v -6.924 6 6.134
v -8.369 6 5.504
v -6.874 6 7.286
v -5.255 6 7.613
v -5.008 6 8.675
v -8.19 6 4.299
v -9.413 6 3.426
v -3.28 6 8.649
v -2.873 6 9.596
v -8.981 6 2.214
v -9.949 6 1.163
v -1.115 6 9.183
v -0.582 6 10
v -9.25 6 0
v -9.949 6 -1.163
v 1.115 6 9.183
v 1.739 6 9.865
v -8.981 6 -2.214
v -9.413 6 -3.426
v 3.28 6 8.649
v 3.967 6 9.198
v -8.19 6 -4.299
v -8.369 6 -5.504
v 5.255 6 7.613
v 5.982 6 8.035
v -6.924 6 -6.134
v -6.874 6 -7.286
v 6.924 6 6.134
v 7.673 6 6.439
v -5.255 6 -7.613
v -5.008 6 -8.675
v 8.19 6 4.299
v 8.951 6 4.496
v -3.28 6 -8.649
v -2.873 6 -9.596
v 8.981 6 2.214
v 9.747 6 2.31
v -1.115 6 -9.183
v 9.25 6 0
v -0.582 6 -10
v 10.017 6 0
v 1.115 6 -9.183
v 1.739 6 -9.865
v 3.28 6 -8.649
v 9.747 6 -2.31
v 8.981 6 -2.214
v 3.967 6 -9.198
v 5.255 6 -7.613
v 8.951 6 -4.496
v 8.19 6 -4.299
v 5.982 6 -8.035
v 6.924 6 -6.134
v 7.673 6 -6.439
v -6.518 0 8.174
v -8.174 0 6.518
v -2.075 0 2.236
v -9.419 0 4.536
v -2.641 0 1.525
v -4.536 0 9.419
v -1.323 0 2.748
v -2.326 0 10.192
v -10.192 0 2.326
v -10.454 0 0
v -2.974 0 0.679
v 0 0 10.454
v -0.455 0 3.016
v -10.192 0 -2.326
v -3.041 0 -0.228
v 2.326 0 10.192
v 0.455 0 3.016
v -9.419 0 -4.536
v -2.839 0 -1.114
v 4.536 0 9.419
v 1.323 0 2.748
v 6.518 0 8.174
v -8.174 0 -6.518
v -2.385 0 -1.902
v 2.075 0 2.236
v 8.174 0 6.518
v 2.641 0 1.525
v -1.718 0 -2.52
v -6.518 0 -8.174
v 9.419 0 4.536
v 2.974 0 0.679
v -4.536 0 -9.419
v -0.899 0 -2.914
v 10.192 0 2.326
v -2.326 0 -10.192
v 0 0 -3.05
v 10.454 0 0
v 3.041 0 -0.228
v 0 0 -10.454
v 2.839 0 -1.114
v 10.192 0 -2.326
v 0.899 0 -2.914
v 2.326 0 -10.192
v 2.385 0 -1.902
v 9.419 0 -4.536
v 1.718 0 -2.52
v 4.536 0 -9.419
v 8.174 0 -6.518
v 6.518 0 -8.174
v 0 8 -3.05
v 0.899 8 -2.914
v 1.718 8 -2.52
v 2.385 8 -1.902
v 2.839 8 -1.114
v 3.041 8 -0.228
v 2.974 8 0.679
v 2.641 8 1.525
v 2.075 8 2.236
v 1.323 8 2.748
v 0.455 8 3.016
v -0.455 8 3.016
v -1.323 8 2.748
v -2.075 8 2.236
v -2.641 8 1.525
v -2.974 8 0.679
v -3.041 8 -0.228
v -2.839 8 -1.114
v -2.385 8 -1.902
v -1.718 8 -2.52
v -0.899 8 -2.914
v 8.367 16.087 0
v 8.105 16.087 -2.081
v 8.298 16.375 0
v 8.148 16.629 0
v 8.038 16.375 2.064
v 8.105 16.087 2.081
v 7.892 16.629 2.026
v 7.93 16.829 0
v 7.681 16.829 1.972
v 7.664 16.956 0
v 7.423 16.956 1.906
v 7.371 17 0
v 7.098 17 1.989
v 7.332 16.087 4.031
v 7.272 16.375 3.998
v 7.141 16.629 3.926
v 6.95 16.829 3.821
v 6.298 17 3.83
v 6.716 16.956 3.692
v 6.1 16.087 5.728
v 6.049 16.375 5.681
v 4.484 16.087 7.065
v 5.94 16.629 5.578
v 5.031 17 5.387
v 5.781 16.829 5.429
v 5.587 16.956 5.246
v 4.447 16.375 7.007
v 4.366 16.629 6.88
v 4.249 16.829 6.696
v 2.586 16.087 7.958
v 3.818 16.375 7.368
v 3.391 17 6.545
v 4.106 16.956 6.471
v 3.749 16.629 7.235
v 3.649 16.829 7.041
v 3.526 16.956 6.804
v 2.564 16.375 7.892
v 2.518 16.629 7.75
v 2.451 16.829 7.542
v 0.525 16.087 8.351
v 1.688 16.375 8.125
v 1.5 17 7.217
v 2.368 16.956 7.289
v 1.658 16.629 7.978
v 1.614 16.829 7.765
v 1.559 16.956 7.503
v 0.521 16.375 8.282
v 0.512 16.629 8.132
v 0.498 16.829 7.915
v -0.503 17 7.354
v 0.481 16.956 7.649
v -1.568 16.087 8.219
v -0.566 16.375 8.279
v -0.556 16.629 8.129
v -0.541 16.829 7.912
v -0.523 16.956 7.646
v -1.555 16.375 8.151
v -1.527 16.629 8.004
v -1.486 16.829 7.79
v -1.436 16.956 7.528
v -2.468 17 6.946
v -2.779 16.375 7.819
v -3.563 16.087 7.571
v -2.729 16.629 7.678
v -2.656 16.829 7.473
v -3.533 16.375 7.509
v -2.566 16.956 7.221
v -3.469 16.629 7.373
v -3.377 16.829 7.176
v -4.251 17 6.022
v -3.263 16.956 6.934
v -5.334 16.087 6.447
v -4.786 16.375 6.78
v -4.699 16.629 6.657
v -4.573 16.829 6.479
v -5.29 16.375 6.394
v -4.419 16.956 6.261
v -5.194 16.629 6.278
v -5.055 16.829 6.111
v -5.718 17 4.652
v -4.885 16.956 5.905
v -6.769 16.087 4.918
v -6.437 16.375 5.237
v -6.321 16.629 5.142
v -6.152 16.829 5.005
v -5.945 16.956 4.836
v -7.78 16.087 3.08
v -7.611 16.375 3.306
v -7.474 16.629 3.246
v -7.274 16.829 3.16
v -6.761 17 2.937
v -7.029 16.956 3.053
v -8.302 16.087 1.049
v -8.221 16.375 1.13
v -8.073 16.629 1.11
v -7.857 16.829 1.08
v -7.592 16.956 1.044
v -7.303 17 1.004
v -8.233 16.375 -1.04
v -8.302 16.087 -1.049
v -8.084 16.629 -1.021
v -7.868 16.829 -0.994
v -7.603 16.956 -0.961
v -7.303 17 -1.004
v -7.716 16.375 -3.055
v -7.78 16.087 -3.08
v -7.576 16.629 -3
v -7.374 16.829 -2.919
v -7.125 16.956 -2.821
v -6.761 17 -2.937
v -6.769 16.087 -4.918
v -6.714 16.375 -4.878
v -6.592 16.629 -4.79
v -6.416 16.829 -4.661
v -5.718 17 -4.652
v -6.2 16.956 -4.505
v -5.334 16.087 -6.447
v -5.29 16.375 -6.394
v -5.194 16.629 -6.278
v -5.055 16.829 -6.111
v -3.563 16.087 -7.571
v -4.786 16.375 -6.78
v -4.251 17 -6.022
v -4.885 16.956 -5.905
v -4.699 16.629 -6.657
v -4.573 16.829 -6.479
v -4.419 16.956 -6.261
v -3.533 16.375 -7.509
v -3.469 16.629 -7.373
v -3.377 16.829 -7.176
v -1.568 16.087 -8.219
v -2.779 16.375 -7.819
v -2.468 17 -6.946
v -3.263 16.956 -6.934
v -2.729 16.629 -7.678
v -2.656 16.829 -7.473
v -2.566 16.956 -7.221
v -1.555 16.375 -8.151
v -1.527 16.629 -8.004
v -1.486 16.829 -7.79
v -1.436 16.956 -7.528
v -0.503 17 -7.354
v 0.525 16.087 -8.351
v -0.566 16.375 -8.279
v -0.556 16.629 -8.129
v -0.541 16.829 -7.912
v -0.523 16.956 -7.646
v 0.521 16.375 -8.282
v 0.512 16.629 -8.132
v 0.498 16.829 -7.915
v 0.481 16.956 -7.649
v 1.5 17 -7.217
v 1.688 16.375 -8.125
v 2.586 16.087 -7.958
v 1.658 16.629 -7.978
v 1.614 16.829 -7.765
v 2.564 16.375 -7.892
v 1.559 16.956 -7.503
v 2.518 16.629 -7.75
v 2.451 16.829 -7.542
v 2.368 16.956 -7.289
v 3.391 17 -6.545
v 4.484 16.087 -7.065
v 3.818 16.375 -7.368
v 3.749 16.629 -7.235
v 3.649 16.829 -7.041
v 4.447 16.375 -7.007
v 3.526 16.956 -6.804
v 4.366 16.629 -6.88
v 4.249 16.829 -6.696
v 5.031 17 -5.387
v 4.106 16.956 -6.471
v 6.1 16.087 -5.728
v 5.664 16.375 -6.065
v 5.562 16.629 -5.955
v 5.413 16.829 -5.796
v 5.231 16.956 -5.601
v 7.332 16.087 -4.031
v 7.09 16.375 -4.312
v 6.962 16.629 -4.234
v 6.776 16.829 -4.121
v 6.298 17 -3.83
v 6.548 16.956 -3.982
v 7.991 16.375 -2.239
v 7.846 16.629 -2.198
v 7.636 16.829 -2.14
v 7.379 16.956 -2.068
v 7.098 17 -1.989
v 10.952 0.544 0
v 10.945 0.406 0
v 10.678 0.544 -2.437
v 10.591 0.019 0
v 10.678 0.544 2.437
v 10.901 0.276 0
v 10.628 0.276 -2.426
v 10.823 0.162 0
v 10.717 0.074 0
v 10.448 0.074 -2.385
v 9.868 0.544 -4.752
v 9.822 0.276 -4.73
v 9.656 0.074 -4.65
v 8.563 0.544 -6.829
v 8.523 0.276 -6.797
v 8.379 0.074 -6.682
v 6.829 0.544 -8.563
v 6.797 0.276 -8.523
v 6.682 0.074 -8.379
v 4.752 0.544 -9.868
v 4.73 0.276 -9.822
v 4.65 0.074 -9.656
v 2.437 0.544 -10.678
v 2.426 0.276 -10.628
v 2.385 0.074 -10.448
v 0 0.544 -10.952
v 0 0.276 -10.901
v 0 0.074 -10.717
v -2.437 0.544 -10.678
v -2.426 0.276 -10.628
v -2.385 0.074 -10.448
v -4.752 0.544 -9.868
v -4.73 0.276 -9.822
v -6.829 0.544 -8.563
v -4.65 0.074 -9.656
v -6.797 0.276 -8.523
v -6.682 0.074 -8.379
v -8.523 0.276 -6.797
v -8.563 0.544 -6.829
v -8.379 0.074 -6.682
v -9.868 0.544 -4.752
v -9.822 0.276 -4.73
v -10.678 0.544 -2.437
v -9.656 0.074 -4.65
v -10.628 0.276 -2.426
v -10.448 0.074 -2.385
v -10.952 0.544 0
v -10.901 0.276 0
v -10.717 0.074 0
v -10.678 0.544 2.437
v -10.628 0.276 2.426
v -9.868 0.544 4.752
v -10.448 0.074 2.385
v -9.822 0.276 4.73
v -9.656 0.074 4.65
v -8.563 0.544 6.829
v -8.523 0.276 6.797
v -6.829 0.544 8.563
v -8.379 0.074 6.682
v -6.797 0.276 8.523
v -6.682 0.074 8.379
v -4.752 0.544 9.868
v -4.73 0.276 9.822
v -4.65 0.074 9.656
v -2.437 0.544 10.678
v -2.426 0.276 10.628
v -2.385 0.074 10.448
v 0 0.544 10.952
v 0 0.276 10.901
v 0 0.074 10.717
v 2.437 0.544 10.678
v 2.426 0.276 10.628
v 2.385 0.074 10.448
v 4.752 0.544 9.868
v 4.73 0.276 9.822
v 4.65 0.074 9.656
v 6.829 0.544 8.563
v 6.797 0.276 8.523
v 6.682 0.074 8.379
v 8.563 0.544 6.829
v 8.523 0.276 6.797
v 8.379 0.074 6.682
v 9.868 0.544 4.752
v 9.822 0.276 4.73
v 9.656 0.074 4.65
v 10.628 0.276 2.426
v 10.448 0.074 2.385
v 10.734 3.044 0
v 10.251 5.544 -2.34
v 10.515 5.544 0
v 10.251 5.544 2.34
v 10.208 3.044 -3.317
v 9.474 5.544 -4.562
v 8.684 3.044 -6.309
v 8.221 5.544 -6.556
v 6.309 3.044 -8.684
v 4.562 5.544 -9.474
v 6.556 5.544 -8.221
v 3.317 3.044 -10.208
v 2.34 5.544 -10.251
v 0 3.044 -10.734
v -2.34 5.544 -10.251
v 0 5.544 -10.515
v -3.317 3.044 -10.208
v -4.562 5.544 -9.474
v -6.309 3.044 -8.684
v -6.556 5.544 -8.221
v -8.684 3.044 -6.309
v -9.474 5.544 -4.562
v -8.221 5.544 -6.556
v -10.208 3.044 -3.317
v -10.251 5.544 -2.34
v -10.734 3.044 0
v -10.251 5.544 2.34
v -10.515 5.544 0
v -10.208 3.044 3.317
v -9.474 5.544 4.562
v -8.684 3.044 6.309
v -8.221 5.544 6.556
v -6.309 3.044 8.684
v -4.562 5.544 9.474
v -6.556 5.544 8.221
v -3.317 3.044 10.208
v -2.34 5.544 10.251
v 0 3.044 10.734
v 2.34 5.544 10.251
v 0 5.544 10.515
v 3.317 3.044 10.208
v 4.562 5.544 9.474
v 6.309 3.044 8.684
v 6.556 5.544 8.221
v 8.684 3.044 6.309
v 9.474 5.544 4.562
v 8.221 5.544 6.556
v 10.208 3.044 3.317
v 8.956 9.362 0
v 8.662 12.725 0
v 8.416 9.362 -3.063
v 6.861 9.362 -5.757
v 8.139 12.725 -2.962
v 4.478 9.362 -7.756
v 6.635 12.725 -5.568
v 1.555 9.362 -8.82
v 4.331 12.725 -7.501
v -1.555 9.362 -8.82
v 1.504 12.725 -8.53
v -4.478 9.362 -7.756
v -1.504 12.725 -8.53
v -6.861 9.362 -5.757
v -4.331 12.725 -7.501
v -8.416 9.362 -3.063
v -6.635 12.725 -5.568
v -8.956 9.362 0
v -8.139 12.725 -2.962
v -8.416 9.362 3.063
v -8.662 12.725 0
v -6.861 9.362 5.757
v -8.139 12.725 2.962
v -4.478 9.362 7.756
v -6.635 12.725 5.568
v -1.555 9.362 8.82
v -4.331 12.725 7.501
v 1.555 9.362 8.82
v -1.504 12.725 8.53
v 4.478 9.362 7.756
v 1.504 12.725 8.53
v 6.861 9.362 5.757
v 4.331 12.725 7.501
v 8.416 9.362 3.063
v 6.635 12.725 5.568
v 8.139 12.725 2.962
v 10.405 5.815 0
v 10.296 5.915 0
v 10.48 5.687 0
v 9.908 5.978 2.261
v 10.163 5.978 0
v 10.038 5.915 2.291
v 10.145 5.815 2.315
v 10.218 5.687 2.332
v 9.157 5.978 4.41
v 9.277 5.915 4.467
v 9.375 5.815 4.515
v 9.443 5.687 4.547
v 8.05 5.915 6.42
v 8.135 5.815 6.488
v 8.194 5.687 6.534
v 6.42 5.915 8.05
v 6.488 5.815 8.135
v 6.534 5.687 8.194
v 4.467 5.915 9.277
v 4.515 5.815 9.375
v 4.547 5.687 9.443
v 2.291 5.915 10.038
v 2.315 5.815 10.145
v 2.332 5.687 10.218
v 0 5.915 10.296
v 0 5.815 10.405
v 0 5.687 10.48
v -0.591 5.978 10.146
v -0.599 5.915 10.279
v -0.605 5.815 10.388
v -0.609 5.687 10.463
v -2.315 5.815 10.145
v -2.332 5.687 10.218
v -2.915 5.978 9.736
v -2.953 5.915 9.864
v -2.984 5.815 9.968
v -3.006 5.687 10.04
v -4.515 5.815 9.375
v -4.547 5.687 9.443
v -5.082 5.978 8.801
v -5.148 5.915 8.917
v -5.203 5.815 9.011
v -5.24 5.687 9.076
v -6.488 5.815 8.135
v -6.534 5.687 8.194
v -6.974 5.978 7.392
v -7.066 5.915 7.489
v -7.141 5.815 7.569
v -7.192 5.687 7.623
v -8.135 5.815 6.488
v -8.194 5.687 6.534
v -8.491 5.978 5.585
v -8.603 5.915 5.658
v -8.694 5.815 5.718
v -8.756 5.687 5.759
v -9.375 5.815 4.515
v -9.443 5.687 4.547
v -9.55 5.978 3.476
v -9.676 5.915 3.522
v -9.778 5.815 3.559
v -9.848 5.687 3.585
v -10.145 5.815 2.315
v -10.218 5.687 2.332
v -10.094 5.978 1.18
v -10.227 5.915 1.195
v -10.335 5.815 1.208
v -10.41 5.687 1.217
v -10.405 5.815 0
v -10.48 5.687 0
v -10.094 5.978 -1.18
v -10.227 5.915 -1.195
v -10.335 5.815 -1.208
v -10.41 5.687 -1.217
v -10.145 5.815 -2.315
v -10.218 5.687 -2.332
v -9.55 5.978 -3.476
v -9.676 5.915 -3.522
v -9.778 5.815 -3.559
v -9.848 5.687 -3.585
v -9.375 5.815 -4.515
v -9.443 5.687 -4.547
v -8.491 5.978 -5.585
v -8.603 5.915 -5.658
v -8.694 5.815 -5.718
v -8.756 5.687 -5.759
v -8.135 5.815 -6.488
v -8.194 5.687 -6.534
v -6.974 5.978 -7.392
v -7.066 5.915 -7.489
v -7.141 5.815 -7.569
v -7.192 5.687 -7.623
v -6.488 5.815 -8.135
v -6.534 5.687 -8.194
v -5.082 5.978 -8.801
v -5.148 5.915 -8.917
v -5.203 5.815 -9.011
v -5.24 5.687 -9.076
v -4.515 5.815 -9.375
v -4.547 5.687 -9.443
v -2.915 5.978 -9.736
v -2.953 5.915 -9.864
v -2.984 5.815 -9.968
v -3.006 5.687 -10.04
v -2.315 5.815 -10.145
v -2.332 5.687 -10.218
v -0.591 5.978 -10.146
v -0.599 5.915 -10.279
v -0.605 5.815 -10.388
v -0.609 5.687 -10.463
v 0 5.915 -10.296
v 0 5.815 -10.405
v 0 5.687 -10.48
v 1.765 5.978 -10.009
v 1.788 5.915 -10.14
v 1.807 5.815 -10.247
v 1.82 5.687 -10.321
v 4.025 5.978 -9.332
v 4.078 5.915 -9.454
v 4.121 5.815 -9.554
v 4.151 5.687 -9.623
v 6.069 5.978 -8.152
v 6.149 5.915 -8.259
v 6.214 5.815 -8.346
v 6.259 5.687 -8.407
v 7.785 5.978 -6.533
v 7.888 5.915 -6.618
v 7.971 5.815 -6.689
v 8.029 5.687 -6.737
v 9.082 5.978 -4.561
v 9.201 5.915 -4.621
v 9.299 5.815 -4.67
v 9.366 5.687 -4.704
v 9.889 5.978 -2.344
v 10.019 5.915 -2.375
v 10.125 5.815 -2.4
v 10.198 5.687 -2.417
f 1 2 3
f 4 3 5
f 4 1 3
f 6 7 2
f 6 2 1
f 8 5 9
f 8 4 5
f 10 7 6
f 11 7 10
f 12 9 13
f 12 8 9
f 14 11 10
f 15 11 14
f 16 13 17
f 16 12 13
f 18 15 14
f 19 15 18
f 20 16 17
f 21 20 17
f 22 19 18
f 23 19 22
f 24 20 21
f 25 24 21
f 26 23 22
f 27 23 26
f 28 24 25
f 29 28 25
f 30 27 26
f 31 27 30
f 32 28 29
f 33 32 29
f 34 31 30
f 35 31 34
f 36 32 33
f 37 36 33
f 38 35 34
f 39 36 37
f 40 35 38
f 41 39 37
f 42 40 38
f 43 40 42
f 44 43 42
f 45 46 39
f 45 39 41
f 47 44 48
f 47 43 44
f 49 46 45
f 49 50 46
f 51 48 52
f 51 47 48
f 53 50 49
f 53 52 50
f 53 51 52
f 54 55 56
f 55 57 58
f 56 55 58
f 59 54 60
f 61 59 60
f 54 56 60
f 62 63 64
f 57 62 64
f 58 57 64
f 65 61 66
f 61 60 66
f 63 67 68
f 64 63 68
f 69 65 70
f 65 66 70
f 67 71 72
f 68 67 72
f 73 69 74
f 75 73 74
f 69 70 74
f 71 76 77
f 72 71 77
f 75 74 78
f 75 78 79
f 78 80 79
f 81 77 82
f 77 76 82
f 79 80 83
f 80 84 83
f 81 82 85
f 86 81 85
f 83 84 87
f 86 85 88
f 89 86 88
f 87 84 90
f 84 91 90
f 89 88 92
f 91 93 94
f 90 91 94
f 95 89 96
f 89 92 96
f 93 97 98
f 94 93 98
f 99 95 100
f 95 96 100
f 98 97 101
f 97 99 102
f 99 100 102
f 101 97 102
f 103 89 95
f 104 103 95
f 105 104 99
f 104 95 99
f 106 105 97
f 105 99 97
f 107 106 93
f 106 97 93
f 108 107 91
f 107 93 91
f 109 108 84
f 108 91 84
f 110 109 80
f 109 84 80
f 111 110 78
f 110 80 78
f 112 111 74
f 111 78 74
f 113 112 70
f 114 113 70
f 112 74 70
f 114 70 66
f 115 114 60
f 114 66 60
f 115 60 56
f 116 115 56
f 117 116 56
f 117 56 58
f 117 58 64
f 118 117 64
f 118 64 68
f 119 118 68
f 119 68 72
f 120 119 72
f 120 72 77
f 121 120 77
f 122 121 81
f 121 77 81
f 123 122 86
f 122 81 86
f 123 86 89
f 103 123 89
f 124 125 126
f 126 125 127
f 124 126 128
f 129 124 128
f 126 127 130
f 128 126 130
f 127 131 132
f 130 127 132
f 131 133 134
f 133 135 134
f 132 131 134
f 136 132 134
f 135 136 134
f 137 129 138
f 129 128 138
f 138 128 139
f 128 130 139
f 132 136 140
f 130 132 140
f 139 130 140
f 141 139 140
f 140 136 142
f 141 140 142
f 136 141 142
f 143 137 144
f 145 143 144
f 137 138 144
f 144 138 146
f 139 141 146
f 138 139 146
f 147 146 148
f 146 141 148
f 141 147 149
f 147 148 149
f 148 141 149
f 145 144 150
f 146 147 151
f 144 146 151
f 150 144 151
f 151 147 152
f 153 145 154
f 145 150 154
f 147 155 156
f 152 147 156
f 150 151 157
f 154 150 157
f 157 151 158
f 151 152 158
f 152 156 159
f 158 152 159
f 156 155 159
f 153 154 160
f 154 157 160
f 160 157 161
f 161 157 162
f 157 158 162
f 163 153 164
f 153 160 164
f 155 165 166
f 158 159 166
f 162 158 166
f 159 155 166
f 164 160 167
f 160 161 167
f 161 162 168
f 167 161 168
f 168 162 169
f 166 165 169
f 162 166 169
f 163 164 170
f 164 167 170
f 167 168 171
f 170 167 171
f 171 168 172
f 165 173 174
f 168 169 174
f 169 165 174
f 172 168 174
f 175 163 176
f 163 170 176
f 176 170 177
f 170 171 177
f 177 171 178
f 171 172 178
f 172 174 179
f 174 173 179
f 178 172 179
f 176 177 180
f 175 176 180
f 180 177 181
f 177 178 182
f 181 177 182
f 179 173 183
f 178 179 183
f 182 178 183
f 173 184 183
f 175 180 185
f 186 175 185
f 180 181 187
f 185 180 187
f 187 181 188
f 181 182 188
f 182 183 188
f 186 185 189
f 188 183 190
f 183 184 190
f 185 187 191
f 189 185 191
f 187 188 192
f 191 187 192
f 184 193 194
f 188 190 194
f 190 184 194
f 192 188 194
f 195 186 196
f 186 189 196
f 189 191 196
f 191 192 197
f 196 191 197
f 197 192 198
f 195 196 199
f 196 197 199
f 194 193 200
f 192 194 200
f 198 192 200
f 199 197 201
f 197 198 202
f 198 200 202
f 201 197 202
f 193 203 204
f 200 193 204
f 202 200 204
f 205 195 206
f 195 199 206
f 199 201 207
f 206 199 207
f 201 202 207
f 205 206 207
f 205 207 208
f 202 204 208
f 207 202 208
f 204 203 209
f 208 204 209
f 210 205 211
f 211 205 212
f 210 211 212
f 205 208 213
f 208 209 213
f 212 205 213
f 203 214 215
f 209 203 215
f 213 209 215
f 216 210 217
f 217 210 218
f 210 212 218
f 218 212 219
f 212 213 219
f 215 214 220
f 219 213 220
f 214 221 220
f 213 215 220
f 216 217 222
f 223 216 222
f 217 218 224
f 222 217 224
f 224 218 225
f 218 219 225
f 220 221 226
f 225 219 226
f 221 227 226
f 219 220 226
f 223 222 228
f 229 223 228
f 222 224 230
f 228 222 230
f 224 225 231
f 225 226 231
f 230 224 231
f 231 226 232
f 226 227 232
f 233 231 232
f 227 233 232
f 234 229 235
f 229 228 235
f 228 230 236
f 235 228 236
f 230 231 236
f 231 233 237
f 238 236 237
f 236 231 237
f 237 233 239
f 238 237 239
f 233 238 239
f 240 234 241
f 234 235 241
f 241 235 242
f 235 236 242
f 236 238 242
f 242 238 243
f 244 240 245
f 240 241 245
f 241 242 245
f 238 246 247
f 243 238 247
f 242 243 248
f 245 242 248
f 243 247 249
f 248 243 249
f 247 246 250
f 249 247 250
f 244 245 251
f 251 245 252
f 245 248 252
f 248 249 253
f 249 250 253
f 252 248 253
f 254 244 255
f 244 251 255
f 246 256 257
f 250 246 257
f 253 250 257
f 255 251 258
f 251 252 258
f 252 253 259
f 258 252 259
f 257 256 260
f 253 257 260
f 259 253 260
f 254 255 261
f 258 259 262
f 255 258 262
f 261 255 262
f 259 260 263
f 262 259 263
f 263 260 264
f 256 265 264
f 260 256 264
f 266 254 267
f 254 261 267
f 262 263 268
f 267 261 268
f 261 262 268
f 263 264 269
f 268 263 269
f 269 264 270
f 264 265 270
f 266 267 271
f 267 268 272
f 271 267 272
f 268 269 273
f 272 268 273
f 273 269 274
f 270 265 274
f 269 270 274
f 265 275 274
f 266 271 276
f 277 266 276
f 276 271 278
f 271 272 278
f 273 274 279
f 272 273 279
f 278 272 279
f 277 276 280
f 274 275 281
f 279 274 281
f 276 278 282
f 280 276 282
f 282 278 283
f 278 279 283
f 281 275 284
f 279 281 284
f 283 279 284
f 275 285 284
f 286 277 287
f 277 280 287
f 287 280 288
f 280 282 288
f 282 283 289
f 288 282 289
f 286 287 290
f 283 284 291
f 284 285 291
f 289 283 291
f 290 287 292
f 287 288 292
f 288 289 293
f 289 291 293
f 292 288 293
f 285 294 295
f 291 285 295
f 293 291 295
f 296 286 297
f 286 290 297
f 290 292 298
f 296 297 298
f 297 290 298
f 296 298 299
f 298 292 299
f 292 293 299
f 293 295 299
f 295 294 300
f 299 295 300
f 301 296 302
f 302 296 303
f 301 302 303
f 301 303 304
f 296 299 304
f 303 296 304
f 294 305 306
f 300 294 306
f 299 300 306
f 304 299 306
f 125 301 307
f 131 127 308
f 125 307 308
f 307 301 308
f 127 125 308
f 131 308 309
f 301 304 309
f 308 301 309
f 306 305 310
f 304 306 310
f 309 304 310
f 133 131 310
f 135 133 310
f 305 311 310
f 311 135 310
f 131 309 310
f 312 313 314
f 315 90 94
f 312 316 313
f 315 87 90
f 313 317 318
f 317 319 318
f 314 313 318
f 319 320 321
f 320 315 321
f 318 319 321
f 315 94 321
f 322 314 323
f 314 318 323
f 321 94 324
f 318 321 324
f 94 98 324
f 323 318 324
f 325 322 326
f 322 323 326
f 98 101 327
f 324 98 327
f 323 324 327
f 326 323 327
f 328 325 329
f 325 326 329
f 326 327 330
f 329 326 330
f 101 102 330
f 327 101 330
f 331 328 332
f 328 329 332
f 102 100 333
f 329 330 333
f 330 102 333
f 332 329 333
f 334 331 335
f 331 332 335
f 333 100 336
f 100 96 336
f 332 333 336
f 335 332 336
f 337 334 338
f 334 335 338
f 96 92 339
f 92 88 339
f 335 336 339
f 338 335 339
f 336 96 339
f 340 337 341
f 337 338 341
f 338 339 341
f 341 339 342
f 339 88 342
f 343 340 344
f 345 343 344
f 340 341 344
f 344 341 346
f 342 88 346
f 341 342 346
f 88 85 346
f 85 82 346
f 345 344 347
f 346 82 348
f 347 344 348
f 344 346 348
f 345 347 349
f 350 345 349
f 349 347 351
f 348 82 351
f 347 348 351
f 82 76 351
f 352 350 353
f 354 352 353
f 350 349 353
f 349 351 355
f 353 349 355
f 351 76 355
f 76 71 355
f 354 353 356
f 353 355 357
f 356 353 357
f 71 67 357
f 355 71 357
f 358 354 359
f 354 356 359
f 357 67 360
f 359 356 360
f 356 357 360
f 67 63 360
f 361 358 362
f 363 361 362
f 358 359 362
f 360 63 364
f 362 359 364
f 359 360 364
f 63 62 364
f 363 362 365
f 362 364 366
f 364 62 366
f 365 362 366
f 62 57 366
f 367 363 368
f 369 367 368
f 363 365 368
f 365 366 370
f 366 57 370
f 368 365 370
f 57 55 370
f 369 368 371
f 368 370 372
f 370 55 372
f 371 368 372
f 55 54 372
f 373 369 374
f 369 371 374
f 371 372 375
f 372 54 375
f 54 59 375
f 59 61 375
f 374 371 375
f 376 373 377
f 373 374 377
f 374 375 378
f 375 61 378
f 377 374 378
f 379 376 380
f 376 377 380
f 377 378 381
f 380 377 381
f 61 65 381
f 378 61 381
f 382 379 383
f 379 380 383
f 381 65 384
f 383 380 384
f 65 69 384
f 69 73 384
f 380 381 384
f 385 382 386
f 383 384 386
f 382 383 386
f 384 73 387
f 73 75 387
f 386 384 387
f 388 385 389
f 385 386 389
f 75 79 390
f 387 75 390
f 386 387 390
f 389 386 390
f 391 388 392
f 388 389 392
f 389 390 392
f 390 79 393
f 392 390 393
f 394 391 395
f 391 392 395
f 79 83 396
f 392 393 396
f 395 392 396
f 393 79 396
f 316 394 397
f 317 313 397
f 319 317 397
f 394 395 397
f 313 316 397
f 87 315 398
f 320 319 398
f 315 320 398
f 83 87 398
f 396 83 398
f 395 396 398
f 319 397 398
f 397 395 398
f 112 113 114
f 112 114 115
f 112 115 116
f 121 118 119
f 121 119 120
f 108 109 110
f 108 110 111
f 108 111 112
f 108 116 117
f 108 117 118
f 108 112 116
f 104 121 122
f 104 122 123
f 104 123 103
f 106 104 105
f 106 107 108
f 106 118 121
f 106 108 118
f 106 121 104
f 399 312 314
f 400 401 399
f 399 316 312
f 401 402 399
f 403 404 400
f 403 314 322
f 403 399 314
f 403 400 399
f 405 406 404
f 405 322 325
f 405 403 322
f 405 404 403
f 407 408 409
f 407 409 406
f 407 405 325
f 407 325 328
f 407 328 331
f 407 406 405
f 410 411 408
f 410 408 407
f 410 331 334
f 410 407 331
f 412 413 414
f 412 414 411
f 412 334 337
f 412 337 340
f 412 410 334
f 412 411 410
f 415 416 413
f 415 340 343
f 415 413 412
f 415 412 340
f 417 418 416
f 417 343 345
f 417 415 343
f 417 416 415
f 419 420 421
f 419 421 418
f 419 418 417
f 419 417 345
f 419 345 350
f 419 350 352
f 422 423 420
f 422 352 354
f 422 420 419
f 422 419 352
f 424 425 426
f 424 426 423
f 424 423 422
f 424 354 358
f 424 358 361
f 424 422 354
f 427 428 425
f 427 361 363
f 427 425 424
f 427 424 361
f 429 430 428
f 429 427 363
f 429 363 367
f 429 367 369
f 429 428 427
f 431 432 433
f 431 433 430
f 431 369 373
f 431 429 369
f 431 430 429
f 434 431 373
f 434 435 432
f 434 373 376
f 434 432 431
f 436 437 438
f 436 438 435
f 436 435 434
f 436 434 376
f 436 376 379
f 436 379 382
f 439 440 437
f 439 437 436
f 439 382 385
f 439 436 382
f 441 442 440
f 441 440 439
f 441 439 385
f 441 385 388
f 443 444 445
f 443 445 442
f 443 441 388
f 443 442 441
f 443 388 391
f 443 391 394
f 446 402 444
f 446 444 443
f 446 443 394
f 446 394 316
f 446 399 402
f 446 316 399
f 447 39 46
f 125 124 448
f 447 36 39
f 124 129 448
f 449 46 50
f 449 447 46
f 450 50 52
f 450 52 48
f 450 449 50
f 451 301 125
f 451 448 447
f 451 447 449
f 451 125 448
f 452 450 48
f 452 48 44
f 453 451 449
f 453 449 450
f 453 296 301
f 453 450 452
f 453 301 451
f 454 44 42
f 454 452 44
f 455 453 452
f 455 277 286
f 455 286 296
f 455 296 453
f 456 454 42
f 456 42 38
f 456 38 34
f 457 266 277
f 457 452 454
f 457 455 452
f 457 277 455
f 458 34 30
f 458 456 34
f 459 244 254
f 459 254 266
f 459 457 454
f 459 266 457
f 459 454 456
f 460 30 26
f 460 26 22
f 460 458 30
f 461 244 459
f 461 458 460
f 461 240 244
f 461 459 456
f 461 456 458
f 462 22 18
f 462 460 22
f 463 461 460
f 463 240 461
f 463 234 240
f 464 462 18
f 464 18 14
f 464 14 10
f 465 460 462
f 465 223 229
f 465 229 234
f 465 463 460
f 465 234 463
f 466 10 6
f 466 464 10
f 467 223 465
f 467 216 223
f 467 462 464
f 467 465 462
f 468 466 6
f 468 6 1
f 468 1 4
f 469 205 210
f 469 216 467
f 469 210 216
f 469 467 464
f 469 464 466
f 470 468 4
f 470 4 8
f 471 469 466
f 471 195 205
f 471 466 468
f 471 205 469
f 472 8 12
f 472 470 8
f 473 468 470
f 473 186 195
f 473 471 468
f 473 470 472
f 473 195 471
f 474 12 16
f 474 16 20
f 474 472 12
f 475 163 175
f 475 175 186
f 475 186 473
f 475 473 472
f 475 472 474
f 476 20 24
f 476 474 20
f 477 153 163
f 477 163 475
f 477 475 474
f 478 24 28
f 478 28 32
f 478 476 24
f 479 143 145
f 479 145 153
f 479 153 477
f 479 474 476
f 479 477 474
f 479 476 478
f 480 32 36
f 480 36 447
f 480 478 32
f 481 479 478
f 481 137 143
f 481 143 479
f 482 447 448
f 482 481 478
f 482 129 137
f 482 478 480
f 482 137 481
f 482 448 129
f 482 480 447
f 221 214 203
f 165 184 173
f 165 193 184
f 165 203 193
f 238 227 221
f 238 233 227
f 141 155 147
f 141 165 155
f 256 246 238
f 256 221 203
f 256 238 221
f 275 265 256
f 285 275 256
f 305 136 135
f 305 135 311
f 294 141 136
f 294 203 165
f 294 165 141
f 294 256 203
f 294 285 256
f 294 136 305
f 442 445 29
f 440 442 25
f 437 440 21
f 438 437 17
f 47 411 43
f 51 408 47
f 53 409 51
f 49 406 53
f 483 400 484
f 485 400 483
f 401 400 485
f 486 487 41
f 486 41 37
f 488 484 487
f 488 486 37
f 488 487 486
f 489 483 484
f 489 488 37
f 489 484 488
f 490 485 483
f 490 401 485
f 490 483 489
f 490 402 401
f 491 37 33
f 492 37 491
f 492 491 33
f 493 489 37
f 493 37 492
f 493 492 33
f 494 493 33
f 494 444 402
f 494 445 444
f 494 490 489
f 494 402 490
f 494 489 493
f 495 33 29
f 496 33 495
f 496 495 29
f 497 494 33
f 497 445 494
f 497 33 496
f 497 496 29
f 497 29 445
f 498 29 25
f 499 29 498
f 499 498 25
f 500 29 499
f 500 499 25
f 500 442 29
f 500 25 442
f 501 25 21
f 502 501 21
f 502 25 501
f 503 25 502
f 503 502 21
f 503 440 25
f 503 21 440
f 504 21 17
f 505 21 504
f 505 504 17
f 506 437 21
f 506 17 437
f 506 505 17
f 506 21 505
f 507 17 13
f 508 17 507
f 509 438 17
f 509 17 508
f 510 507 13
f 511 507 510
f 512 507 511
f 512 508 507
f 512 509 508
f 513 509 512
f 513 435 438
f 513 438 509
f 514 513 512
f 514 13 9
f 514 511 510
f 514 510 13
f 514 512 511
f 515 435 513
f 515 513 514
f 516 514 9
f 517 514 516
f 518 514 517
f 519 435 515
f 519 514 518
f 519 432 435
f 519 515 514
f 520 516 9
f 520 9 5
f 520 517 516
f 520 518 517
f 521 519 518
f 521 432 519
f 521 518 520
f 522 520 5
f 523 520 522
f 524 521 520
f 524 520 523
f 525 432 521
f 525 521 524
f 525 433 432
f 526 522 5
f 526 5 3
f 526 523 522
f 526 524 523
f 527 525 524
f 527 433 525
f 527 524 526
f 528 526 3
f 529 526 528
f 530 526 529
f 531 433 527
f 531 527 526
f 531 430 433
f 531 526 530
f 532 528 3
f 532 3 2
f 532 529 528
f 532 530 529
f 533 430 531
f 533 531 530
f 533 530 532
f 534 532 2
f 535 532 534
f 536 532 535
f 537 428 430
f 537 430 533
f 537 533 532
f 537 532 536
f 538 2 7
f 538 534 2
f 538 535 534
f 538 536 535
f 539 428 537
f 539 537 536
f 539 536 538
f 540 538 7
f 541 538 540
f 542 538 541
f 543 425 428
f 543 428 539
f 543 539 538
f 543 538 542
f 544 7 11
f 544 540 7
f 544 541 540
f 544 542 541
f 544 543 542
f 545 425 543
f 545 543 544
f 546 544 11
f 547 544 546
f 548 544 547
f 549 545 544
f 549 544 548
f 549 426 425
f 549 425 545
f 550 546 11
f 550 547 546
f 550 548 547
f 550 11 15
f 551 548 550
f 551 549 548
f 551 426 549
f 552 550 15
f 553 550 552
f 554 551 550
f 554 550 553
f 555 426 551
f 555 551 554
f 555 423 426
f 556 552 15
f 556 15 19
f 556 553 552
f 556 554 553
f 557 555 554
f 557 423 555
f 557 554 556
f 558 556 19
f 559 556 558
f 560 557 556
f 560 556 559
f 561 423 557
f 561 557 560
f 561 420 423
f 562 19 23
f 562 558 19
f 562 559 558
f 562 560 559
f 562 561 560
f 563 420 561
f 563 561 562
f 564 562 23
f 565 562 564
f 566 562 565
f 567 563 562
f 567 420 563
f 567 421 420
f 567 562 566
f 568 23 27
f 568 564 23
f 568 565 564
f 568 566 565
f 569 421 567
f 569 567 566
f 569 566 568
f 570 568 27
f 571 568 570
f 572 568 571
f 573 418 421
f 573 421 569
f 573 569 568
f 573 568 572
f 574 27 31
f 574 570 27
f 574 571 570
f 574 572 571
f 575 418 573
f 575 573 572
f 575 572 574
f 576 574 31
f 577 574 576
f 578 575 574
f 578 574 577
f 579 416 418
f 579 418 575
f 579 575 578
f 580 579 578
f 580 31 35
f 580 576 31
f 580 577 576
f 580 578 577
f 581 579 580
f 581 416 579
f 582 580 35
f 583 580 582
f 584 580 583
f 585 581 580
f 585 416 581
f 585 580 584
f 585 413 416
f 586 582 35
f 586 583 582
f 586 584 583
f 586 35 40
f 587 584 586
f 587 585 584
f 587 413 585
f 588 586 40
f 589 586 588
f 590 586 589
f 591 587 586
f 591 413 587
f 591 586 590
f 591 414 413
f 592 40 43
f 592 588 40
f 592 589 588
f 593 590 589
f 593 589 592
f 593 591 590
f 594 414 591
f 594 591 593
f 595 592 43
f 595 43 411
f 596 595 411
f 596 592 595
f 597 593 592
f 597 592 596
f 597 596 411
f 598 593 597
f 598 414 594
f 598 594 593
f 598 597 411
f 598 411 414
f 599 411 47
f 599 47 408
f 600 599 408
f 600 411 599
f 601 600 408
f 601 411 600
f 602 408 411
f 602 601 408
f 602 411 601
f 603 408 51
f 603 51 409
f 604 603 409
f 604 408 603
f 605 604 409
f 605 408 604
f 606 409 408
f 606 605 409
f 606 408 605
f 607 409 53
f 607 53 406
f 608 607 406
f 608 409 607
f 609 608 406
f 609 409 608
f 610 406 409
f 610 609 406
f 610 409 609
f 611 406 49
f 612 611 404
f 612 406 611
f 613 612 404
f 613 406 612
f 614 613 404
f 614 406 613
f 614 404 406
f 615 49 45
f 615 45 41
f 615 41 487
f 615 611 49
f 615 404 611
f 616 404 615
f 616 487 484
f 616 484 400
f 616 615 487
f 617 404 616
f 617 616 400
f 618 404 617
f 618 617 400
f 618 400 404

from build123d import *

# Parameters (mm, degrees)
SKETCH1_R           = 11
BOSS_EXTRUDE1_DEPTH = 6
BOSS_EXTRUDE1_TAPER = 5
SKETCH2_R           = 9.25
BOSS_EXTRUDE2_DEPTH = 11
BOSS_EXTRUDE2_TAPER = 5
SKETCH3_R           = 3.05
CUT_EXTRUDE1_DEPTH  = 8
FILLET1_R           = 1
FILLET2_R           = 0.5
FILLET3_R           = 0.5


with BuildPart() as part:
    # Sketch1 → Boss-Extrude1 (new body)
    with BuildSketch(Plane(origin=(0, 0, 0), x_dir=(1, 0, 0), z_dir=(0, 1, 0))):
        Circle(SKETCH1_R)
    extrude(amount=BOSS_EXTRUDE1_DEPTH, taper=BOSS_EXTRUDE1_TAPER)

    # Sketch2 → Boss-Extrude2 (add)
    with BuildSketch(Plane(origin=(0, 6, 0), x_dir=(1, 0, 0), z_dir=(0, 1, 0))):
        Circle(SKETCH2_R)
    extrude(amount=BOSS_EXTRUDE2_DEPTH, taper=BOSS_EXTRUDE2_TAPER)

    # Sketch3 → Cut-Extrude1 (cut)
    with BuildSketch(Plane.XZ):
        Circle(SKETCH3_R)
    extrude(amount=-CUT_EXTRUDE1_DEPTH, mode=Mode.SUBTRACT)

    # Fillet1
    fillet1_edges = [part.edges().sort_by_distance(p)[0] for p in [
        (-8.287624701, 17, 0),
    ]]
    fillet(fillet1_edges, radius=FILLET1_R)

    # Fillet2
    fillet2_edges = [part.edges().sort_by_distance(p)[0] for p in [
        (-10.475068019, 6, 0),
    ]]
    fillet(fillet2_edges, radius=FILLET2_R)

    # Fillet3
    fillet3_edges = [part.edges().sort_by_distance(p)[0] for p in [
        (-11, 0, 0),
    ]]
    fillet(fillet3_edges, radius=FILLET3_R)


solid = part.part
